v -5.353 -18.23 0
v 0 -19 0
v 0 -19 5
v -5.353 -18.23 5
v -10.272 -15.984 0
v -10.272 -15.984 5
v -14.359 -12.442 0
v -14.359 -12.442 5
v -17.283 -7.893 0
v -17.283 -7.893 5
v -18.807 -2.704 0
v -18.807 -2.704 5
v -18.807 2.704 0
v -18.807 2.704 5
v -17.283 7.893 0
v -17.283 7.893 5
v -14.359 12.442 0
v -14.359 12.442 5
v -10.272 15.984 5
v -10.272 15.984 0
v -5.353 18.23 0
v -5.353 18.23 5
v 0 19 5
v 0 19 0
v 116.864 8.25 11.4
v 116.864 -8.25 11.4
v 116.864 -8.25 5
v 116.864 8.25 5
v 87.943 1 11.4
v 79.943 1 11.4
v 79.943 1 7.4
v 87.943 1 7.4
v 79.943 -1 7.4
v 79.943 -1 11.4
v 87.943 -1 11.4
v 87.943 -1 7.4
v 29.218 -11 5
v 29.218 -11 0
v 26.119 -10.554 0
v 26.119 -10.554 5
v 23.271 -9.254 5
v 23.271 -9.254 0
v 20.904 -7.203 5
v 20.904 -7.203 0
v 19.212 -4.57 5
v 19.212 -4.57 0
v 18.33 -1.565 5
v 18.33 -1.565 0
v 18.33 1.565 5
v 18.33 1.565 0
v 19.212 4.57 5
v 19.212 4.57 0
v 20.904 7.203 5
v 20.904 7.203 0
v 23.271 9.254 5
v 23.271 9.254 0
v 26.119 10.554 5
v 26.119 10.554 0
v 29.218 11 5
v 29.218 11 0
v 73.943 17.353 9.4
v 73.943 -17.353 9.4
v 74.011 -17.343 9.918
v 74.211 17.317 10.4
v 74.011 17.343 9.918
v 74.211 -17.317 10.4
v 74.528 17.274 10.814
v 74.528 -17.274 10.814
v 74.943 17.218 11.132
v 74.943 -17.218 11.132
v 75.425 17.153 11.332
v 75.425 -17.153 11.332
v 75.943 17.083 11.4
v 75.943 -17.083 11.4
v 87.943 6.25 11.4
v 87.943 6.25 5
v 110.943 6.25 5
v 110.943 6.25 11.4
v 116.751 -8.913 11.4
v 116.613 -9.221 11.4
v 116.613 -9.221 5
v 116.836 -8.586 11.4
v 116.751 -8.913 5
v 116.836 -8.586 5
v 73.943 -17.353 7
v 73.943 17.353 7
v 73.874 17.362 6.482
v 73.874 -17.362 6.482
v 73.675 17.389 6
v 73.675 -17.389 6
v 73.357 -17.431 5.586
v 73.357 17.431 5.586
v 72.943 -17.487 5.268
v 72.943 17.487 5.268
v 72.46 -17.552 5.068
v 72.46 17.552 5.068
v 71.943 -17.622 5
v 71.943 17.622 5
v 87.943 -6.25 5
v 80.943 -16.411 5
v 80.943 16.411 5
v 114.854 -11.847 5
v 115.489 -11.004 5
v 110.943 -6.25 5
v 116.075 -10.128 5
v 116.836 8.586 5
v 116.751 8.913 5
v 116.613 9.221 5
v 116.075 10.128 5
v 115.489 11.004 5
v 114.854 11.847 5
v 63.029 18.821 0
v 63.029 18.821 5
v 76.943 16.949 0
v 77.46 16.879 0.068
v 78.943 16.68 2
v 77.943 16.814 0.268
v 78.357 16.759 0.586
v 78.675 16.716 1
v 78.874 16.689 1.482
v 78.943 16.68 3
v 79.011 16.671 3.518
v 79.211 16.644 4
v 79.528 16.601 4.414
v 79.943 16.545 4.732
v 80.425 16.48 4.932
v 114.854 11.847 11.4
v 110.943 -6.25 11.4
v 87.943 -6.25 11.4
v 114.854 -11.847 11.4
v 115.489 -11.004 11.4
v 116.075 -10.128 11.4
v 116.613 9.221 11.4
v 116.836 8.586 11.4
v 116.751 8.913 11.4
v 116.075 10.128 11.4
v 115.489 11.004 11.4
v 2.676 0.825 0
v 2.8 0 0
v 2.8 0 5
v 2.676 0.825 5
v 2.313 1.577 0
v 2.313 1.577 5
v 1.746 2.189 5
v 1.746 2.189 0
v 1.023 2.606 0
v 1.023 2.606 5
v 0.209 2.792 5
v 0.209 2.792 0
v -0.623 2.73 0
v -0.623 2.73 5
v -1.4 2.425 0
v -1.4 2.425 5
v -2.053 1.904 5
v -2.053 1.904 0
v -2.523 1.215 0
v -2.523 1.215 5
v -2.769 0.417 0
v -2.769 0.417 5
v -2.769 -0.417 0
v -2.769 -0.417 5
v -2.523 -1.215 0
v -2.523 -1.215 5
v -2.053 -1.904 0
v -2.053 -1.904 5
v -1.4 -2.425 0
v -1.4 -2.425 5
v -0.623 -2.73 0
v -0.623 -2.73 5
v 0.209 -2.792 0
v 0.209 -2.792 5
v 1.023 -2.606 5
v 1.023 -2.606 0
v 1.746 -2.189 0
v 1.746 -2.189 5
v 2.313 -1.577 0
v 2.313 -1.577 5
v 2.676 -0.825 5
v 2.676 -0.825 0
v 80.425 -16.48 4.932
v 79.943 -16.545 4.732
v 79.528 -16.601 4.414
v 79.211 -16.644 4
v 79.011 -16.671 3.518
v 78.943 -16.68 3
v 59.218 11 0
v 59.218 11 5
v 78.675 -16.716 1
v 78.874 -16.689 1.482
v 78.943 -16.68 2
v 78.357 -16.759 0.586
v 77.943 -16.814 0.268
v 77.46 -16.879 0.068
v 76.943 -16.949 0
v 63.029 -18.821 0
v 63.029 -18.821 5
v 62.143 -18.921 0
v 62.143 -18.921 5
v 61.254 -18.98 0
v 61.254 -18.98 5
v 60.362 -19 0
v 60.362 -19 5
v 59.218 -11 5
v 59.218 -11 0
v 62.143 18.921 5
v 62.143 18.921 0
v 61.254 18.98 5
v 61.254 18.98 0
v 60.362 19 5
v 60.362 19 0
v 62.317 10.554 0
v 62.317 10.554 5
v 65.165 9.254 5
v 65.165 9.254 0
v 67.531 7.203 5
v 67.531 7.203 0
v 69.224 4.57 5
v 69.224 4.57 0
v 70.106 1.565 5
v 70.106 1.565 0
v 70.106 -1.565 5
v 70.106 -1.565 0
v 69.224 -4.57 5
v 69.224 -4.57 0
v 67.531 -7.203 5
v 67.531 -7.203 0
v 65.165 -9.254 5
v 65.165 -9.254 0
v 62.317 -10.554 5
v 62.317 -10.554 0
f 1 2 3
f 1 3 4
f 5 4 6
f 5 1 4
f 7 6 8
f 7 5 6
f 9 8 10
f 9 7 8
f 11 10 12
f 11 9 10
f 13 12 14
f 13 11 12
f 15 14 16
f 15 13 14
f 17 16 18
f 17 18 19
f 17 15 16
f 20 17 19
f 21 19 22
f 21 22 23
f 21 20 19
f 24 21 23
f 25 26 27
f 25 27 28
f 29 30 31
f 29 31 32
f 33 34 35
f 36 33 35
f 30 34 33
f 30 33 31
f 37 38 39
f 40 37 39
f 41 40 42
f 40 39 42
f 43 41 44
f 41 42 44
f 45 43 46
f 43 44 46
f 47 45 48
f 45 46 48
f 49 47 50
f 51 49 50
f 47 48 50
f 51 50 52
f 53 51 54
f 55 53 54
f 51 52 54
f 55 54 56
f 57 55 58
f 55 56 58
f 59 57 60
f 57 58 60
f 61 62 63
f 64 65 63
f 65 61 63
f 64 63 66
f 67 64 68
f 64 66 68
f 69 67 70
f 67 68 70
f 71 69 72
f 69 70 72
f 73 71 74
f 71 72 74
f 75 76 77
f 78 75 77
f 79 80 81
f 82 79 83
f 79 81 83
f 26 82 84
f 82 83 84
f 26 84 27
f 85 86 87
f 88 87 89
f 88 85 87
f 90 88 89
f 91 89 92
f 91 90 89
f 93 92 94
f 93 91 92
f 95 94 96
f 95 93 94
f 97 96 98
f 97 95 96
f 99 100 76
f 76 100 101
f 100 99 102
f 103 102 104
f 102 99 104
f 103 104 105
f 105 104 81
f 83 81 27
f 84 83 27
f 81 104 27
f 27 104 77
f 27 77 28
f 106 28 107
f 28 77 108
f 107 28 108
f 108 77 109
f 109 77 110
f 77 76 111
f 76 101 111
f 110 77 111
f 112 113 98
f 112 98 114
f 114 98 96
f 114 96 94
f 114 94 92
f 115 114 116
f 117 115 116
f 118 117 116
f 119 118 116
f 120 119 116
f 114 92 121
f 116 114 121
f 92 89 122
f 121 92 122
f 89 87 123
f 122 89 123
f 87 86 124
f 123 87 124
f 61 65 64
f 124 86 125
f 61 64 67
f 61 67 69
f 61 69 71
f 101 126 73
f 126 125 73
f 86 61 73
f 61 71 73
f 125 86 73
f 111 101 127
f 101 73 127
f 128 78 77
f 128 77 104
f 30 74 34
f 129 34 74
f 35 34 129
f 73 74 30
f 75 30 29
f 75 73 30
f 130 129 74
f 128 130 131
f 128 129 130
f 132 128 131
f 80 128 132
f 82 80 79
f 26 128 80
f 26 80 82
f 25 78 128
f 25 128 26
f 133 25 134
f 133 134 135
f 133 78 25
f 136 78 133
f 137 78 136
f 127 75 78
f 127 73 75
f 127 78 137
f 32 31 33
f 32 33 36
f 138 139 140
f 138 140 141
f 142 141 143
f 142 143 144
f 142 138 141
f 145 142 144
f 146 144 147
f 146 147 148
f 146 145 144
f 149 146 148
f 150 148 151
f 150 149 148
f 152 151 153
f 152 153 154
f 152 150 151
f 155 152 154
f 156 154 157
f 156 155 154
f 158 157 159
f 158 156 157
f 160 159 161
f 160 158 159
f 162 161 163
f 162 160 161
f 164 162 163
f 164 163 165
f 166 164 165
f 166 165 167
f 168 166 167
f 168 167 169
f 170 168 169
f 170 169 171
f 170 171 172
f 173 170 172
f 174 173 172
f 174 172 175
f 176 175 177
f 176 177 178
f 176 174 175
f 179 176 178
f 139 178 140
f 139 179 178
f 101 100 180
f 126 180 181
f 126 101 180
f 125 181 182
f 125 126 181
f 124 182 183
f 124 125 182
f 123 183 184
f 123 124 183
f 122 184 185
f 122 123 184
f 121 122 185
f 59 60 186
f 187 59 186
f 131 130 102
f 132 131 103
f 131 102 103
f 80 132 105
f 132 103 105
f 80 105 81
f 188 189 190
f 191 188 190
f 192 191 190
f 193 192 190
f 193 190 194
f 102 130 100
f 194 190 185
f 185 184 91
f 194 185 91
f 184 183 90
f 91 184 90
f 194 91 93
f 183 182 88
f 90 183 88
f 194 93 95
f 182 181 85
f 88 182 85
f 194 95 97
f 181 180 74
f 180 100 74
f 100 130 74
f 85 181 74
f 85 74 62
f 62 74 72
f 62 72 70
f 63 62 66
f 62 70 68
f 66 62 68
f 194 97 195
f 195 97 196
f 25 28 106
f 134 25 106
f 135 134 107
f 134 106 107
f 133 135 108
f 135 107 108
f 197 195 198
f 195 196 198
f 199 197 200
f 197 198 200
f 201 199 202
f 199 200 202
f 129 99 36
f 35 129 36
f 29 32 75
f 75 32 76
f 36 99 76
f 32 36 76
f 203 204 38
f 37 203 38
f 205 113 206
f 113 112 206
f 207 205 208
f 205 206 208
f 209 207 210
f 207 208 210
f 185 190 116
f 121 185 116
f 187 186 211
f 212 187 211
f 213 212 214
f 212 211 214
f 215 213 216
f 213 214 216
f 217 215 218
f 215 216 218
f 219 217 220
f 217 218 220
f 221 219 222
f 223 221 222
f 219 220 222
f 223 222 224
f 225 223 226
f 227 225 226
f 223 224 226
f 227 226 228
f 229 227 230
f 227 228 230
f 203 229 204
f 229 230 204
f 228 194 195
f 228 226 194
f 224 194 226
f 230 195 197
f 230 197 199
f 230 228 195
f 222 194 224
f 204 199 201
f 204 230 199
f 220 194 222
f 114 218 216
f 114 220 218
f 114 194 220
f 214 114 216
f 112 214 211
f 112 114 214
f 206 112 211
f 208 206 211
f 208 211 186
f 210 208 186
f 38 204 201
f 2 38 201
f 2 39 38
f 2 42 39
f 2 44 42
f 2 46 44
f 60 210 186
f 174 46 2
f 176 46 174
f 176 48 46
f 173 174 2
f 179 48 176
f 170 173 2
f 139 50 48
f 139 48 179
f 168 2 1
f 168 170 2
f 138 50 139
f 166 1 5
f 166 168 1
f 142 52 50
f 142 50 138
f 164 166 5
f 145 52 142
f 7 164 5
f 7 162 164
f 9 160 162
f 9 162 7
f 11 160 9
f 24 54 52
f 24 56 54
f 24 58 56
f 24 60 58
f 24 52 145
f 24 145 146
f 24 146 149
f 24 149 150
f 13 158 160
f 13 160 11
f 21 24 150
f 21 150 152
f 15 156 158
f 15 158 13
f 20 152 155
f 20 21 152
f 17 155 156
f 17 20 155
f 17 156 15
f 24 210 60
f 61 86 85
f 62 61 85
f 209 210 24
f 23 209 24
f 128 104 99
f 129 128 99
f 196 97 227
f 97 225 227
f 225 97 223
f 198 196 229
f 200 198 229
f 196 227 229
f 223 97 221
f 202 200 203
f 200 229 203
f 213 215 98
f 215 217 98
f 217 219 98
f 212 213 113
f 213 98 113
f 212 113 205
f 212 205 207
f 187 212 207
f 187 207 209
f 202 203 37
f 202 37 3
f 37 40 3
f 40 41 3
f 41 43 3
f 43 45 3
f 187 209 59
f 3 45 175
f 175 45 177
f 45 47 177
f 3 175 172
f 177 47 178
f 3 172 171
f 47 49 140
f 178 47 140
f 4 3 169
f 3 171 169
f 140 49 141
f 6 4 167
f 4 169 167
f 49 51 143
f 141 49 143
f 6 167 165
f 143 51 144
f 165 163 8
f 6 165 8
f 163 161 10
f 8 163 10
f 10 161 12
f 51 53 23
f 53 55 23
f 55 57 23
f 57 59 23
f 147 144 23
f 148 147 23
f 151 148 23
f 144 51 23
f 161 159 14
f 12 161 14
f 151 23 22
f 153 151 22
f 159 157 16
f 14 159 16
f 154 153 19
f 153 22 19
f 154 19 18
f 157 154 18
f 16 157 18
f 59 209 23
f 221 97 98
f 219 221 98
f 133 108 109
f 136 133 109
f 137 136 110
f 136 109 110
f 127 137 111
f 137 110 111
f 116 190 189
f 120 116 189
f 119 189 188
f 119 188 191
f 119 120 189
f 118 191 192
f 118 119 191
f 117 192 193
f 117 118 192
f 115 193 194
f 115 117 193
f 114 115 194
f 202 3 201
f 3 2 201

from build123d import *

# Parameters (mm, degrees)
SKETCH1_R           = 2.8
BOSS_EXTRUDE1_DEPTH = 5
FILLET1_R           = 2
BOSS_EXTRUDE2_DEPTH = 6.4
FILLET2_R           = 2
SKETCH3_W           = 8
SKETCH3_H           = 2
CUT_EXTRUDE1_DEPTH  = 4
SKETCH6_W           = 104.287250585
SKETCH6_H           = 38
CUT_EXTRUDE3_DEPTH  = 5
FILLET3_R           = 2
BOSS_EXTRUDE3_DEPTH = 6.4
CUT_EXTRUDE4_DEPTH  = 52
FILLET4_R           = 20


with BuildPart() as part:
    # Sketch1 → Boss-Extrude1 (new body)
    with BuildSketch(Plane.XY):
        with BuildLine():
            Line((0, 19), (100, 19))
            ThreePointArc((100, 19), (111.005680352, 15.487898502), (117.942616866, 6.25))
            Line((117.942616866, 6.25), (87.942616866, 6.25))
            Line((87.942616866, 6.25), (87.942616866, -6.25))
            Line((87.942616866, -6.25), (117.942616866, -6.25))
            ThreePointArc((117.942616866, -6.25), (111.005680352, -15.487898502), (100, -19))
            Line((100, -19), (0, -19))
            ThreePointArc((0, -19), (-19, 0), (0, 19))
        make_face()
        Circle(SKETCH1_R, mode=Mode.SUBTRACT)
        with BuildLine():
            Line((29.217733251, 11), (59.217733251, 11))
            ThreePointArc((59.217733251, 11), (70.217733251, 0), (59.217733251, -11))
            Line((59.217733251, -11), (29.217733251, -11))
            ThreePointArc((29.217733251, -11), (18.217733251, 0), (29.217733251, 11))
        make_face(mode=Mode.SUBTRACT)
    extrude(amount=BOSS_EXTRUDE1_DEPTH)

    # Fillet1
    fillet1_edges = [part.edges().sort_by_distance(p)[0] for p in [
        (117.942616866, 6.25, 2.5),
        (117.942616866, -6.25, 2.5),
    ]]
    fillet(fillet1_edges, radius=FILLET1_R)

    # Sketch2 → Boss-Extrude2 (add)
    with BuildSketch(Plane.XY.offset(5)):
        with BuildLine():
            Line((73.942616866, 19), (73.942616866, -19))
            Line((73.942616866, -19), (100, -19))
            ThreePointArc((100, -19), (109.638693468, -16.373624774), (116.612668437, -9.220588235))
            ThreePointArc((116.612668437, -9.220588235), (116.587505946, -7.235400688), (114.863966496, -6.25))
            Line((114.863966496, -6.25), (87.942616866, -6.25))
            Line((87.942616866, -6.25), (87.942616866, 6.25))
            Line((87.942616866, 6.25), (114.863966496, 6.25))
            ThreePointArc((114.863966496, 6.25), (116.587505946, 7.235400688), (116.612668437, 9.220588235))
            ThreePointArc((116.612668437, 9.220588235), (109.638693468, 16.373624774), (100, 19))
            Line((100, 19), (73.942616866, 19))
        make_face()
    extrude(amount=BOSS_EXTRUDE2_DEPTH)

    # Fillet2
    fillet2_edges = [part.edges().sort_by_distance(p)[0] for p in [
        (73.942616866, 0, 5),
        (73.942616866, 0, 11.4),
    ]]
    fillet(fillet2_edges, radius=FILLET2_R)

    # Sketch3 → Cut-Extrude1 (cut)
    with BuildSketch(Plane.XY.offset(11.4)):
        with Locations((83.942616866, 0)):
            Rectangle(SKETCH3_W, SKETCH3_H)
    extrude(amount=-CUT_EXTRUDE1_DEPTH, mode=Mode.SUBTRACT)

    # Sketch6 → Cut-Extrude3 (cut)
    with BuildSketch(Plane(origin=(0, 0, 0), x_dir=(-1, 0, 0), z_dir=(0, 0, -1))):
        with Locations((-131.086242158, 0)):
            Rectangle(SKETCH6_W, SKETCH6_H)
    extrude(amount=-CUT_EXTRUDE3_DEPTH, mode=Mode.SUBTRACT)

    # Fillet3
    fillet3_edges = [part.edges().sort_by_distance(p)[0] for p in [
        (78.942616866, 0, 0),
        (78.942616866, 0, 5),
    ]]
    fillet(fillet3_edges, radius=FILLET3_R)

    # Sketch7 → Boss-Extrude3 (add)
    with BuildSketch(Plane.XY.offset(11.4)):
        with BuildLine():
            Line((114.863966496, 6.25), (110.942616866, 6.25))
            Line((110.942616866, 6.25), (110.942616866, -6.25))
            Line((110.942616866, -6.25), (114.863966496, -6.25))
            ThreePointArc((114.863966496, -6.25), (116.278180059, -6.835786438), (116.863966496, -8.25))
            Line((116.863966496, -8.25), (116.863966496, 8.25))
            ThreePointArc((116.863966496, 8.25), (116.278180059, 6.835786438), (114.863966496, 6.25))
        make_face()
    extrude(amount=-BOSS_EXTRUDE3_DEPTH)

    # Sketch8 → Cut-Extrude4 (cut)
    with BuildSketch(Plane.XY.offset(11.4)):
        Polygon((49.166460224, 20.686961638), (202.884451104, 0), (49.166460224, -20.686961638), (49.166460224, -34.841866296), (221.786697366, -38.976706561), (223.885725762, 48.652985565), (49.166460224, 52.838104681), (49.166460224, 51.155729305), align=None)
    extrude(amount=-CUT_EXTRUDE4_DEPTH, mode=Mode.SUBTRACT)

    # Fillet4
    fillet4_edges = [part.edges().sort_by_distance(p)[0] for p in [
        (61.701715921, -19, 2.5),
        (61.701715921, 19, 2.5),
    ]]
    fillet(fillet4_edges, radius=FILLET4_R)


solid = part.part
